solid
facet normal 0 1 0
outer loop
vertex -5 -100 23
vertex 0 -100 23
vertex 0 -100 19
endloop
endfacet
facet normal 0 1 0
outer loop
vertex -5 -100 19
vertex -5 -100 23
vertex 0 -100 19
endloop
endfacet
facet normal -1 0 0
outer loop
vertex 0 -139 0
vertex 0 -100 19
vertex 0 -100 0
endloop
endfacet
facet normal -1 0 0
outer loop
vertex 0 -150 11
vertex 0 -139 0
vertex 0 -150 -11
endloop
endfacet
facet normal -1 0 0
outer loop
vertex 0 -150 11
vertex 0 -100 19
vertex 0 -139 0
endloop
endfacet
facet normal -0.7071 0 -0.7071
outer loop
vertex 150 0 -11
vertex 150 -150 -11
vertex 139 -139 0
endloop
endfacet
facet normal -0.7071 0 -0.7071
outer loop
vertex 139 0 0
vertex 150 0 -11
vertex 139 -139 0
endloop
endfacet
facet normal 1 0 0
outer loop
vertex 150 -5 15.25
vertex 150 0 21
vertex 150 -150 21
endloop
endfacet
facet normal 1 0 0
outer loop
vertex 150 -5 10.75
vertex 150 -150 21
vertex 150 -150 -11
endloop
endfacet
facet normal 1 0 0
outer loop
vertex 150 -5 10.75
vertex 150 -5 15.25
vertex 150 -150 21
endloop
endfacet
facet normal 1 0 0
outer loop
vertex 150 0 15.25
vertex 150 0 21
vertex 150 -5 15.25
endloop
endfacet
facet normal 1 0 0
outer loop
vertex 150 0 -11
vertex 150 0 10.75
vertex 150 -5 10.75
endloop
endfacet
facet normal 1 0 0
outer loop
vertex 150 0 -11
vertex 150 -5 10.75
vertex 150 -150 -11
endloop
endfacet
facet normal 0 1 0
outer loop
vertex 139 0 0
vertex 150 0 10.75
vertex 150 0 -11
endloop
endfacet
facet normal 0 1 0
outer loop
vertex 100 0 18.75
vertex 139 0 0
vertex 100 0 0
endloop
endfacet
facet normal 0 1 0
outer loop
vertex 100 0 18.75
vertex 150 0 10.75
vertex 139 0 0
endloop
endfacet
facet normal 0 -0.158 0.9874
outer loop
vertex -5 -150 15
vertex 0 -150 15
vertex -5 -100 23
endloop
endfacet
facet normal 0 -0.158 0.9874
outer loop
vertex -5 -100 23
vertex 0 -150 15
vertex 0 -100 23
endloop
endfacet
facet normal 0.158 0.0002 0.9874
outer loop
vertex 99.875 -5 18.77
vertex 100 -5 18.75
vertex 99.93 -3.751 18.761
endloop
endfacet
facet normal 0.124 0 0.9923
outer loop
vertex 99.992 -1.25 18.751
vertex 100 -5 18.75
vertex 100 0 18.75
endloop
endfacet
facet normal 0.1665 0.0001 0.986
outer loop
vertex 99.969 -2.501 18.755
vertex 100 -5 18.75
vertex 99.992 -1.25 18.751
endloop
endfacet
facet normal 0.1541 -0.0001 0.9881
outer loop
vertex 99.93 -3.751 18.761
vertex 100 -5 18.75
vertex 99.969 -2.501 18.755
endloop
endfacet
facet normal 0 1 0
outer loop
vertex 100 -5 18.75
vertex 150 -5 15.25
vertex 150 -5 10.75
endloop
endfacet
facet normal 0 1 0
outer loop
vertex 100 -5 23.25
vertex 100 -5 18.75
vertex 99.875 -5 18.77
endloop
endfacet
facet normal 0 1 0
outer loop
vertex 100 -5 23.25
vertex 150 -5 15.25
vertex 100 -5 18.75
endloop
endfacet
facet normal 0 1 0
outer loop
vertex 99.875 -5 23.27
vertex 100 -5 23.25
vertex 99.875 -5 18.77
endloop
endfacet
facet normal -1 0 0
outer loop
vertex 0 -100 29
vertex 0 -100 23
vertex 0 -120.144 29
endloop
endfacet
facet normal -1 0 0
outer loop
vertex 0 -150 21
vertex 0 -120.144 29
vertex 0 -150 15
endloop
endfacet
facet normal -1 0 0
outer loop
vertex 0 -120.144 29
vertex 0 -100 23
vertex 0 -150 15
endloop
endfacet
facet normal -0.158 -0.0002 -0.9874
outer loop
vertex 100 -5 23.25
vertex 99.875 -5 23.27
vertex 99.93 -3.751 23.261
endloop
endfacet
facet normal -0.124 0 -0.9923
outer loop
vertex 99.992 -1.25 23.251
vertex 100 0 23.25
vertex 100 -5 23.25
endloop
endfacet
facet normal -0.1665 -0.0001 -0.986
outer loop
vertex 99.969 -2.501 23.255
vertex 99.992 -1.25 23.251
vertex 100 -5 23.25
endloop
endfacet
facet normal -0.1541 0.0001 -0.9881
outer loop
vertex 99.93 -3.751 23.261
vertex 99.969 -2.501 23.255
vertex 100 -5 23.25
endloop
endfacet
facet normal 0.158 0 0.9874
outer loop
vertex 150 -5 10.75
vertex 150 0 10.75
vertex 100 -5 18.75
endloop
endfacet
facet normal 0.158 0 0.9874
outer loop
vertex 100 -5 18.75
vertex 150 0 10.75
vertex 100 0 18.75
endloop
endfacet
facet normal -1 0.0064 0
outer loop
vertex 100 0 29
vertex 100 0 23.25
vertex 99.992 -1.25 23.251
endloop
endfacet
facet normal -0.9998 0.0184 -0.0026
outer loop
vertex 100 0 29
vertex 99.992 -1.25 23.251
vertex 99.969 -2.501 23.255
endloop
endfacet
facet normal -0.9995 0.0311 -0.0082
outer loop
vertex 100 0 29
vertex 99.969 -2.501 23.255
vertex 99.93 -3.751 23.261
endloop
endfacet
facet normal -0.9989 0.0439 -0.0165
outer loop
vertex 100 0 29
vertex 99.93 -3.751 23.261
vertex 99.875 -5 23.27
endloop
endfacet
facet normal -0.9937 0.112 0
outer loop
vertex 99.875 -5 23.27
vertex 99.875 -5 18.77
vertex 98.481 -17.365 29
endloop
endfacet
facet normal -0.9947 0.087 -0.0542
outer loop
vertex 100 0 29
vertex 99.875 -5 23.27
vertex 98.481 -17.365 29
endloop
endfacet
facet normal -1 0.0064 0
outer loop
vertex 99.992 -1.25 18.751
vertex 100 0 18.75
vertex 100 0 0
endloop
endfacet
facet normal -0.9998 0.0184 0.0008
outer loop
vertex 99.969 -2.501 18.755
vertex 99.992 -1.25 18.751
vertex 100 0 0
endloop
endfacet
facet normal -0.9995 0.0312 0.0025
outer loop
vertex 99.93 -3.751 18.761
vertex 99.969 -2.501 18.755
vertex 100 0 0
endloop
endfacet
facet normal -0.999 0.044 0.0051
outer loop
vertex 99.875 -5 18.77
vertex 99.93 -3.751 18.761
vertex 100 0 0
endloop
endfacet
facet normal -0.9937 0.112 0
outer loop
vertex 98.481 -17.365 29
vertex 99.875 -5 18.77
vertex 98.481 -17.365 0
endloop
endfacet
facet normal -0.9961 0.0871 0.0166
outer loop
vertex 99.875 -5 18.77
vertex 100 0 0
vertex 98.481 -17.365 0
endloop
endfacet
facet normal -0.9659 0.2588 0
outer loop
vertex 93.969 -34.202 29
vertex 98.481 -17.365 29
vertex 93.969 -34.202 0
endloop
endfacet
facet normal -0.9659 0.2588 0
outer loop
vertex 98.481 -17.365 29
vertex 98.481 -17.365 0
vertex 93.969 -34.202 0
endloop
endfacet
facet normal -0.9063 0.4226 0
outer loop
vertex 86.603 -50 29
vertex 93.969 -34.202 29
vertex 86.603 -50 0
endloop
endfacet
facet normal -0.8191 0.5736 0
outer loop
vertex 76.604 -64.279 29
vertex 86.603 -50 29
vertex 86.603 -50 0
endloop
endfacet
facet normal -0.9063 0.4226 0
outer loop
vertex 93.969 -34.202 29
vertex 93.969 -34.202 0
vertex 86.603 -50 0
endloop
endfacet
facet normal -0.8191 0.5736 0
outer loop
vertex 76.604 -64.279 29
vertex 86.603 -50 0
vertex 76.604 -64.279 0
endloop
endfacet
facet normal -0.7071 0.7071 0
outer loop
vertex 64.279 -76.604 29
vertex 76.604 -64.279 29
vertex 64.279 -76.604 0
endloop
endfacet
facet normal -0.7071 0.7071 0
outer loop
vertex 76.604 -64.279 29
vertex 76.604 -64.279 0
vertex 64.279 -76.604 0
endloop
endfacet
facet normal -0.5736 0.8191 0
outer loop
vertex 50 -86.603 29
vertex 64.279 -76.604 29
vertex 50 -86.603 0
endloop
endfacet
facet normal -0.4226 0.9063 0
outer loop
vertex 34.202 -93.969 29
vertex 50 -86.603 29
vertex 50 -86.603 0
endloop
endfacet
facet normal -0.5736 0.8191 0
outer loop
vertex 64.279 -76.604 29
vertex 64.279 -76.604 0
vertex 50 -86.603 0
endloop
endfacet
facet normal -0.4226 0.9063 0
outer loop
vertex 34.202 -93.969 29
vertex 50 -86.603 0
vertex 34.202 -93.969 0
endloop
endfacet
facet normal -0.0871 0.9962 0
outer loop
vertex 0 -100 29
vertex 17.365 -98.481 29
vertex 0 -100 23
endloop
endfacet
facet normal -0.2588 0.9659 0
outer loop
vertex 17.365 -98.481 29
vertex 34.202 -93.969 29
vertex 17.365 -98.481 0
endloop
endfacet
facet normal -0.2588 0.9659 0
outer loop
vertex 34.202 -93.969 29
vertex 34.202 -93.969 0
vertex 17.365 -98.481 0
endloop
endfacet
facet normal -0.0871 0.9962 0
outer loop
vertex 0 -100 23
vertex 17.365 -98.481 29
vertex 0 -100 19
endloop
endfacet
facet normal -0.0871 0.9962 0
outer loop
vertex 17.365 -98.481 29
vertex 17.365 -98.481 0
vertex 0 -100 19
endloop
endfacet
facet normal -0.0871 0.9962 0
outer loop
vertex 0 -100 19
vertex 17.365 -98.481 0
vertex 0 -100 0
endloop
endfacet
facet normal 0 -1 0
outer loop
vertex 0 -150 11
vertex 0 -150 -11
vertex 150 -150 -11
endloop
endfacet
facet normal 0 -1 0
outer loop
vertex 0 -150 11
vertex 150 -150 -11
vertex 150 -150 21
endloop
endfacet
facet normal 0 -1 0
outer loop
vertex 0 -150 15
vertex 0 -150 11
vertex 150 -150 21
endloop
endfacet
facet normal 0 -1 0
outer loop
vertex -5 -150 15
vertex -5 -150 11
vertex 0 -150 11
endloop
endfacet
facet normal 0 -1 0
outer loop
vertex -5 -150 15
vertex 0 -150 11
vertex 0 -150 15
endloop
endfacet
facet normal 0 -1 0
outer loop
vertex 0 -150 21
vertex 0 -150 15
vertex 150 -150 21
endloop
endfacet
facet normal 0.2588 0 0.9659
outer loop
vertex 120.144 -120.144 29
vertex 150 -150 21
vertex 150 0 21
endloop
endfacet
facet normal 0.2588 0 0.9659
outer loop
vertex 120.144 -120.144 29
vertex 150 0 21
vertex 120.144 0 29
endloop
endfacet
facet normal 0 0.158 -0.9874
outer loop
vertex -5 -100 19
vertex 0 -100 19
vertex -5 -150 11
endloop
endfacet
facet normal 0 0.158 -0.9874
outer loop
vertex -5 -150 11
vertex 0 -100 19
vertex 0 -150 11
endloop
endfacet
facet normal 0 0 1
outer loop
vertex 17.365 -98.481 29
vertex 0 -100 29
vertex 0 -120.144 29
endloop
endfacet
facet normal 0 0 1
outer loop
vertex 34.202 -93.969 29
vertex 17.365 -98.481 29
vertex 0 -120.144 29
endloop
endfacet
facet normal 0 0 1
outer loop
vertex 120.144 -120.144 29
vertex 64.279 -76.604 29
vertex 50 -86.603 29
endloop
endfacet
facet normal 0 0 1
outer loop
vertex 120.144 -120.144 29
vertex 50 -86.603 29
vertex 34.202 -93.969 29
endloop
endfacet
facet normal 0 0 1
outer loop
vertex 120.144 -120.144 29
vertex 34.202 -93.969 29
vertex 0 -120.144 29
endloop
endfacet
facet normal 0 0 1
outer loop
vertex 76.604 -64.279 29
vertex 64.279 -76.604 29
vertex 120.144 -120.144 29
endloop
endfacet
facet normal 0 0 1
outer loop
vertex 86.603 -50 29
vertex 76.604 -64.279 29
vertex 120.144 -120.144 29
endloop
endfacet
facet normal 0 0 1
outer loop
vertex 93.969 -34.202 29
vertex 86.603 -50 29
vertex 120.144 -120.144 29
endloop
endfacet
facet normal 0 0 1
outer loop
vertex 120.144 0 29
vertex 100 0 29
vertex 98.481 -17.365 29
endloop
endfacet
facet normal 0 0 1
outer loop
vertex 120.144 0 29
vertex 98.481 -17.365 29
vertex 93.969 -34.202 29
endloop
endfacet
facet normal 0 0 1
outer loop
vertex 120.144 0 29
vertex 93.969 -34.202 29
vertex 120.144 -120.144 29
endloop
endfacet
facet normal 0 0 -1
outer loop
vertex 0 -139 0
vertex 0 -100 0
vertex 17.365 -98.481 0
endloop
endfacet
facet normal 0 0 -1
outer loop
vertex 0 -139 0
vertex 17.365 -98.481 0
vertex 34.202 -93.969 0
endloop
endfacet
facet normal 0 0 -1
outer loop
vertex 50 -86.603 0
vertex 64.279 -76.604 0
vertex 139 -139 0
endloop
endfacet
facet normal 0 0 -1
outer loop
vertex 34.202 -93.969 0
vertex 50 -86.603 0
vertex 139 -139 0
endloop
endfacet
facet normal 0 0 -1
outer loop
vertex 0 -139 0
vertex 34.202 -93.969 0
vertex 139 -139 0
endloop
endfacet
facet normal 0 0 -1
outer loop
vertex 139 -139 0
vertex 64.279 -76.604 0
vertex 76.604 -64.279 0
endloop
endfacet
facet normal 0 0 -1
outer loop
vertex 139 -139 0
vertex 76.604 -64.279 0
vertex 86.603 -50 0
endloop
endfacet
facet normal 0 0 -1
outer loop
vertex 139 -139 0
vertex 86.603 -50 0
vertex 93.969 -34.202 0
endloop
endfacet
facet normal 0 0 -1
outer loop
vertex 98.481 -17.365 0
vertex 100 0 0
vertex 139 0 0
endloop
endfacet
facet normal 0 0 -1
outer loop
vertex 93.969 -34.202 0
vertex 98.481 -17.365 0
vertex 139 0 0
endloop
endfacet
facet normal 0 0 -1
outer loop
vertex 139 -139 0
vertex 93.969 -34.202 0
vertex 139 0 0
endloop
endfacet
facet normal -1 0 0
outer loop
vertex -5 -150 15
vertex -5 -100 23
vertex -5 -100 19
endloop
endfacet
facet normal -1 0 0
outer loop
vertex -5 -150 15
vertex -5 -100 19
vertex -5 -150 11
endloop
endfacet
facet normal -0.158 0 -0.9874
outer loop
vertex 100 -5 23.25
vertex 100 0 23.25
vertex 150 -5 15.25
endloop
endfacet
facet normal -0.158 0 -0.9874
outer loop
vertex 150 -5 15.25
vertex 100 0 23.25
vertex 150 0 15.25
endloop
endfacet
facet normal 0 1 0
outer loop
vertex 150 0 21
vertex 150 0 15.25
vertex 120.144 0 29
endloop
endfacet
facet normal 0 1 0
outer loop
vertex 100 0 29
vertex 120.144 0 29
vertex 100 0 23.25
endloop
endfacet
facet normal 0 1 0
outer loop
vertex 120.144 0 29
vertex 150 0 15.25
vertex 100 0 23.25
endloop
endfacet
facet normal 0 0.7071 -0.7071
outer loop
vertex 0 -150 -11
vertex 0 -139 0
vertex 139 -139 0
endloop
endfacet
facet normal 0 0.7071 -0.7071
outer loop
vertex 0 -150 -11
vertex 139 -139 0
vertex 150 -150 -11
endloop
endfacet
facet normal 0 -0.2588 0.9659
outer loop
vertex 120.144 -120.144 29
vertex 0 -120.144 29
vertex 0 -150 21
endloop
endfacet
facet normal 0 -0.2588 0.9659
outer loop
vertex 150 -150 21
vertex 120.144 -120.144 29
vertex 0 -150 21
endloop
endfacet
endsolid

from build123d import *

# Parameters (mm, degrees)
F1_DEPTH  = 29
F3_DEPTH  = 150
F5_DEPTH  = 150.001
F7_DEPTH  = 5
F9_DEPTH  = 5
F11_DEPTH = 150


with BuildPart() as f1:
    # F0 (on Top) → F1 (new body)
    with BuildSketch(Plane.XY):
        with BuildLine():
            Line((150, -150), (150, 0))
            Line((150, 0), (100, 0))
            ThreePointArc((100, 0), (70.7106781187, -70.7106781187), (0, -100))
            Line((0, -100), (0, -150))
            Line((0, -150), (150, -150))
        make_face()
    extrude(amount=F1_DEPTH)

    # F2 (on face) → F3 (cut, through all)
    with BuildSketch(Plane(origin=(0, 0, 0), x_dir=(0, -1, 0), z_dir=(-1, 0, 0))):
        Polygon((150, 29), (120.1435935394, 29), (150, 21), align=None)
    extrude(amount=-F3_DEPTH, mode=Mode.SUBTRACT)

    # F4 (on face) → F5 (cut, through all)
    with BuildSketch(Plane(origin=(0, 0, 0), x_dir=(-1, 0, 0), z_dir=(0, 1, 0))):
        Polygon((-120.1435935394, 29), (-150, 29), (-150, 21), align=None)
    extrude(amount=-F5_DEPTH, mode=Mode.SUBTRACT)

    # F6 (on face) → F7 (join)
    with BuildSketch(Plane(origin=(0, 0, 0), x_dir=(0, -1, 0), z_dir=(-1, 0, 0))):
        Polygon((150, 15), (100, 23), (100, 19), (150, 11), align=None)
    extrude(amount=F7_DEPTH)

    # F8 (on face) → F9 (cut)
    with BuildSketch(Plane(origin=(0, 0, 0), x_dir=(-1, 0, 0), z_dir=(0, 1, 0))):
        Polygon((-95.0627968404, 24.0399525055), (-100, 23.25), (-150, 15.25), (-150, 10.75), (-100, 18.75), (-95.0627968404, 19.5399525055), align=None)
    extrude(amount=-F9_DEPTH, mode=Mode.SUBTRACT)

    # F10 (on face) → F11 (join)
    with BuildSketch(Plane(origin=(0, 0, 0), x_dir=(0, -1, 0), z_dir=(-1, 0, 0))):
        Polygon((150, -11), (150, 0), (139, 0), align=None)
    extrude(amount=-F11_DEPTH)

    # F12 (on face) → F13 (join, up to the next surface of F1)
    with BuildSketch(Plane(origin=(0, 0, 0), x_dir=(-1, 0, 0), z_dir=(0, 1, 0))):
        Polygon((-139, 0), (-150, 0), (-150, -11), align=None)
    extrude(until=Until.NEXT, dir=(0, -1, 0))


solid = f1.part
